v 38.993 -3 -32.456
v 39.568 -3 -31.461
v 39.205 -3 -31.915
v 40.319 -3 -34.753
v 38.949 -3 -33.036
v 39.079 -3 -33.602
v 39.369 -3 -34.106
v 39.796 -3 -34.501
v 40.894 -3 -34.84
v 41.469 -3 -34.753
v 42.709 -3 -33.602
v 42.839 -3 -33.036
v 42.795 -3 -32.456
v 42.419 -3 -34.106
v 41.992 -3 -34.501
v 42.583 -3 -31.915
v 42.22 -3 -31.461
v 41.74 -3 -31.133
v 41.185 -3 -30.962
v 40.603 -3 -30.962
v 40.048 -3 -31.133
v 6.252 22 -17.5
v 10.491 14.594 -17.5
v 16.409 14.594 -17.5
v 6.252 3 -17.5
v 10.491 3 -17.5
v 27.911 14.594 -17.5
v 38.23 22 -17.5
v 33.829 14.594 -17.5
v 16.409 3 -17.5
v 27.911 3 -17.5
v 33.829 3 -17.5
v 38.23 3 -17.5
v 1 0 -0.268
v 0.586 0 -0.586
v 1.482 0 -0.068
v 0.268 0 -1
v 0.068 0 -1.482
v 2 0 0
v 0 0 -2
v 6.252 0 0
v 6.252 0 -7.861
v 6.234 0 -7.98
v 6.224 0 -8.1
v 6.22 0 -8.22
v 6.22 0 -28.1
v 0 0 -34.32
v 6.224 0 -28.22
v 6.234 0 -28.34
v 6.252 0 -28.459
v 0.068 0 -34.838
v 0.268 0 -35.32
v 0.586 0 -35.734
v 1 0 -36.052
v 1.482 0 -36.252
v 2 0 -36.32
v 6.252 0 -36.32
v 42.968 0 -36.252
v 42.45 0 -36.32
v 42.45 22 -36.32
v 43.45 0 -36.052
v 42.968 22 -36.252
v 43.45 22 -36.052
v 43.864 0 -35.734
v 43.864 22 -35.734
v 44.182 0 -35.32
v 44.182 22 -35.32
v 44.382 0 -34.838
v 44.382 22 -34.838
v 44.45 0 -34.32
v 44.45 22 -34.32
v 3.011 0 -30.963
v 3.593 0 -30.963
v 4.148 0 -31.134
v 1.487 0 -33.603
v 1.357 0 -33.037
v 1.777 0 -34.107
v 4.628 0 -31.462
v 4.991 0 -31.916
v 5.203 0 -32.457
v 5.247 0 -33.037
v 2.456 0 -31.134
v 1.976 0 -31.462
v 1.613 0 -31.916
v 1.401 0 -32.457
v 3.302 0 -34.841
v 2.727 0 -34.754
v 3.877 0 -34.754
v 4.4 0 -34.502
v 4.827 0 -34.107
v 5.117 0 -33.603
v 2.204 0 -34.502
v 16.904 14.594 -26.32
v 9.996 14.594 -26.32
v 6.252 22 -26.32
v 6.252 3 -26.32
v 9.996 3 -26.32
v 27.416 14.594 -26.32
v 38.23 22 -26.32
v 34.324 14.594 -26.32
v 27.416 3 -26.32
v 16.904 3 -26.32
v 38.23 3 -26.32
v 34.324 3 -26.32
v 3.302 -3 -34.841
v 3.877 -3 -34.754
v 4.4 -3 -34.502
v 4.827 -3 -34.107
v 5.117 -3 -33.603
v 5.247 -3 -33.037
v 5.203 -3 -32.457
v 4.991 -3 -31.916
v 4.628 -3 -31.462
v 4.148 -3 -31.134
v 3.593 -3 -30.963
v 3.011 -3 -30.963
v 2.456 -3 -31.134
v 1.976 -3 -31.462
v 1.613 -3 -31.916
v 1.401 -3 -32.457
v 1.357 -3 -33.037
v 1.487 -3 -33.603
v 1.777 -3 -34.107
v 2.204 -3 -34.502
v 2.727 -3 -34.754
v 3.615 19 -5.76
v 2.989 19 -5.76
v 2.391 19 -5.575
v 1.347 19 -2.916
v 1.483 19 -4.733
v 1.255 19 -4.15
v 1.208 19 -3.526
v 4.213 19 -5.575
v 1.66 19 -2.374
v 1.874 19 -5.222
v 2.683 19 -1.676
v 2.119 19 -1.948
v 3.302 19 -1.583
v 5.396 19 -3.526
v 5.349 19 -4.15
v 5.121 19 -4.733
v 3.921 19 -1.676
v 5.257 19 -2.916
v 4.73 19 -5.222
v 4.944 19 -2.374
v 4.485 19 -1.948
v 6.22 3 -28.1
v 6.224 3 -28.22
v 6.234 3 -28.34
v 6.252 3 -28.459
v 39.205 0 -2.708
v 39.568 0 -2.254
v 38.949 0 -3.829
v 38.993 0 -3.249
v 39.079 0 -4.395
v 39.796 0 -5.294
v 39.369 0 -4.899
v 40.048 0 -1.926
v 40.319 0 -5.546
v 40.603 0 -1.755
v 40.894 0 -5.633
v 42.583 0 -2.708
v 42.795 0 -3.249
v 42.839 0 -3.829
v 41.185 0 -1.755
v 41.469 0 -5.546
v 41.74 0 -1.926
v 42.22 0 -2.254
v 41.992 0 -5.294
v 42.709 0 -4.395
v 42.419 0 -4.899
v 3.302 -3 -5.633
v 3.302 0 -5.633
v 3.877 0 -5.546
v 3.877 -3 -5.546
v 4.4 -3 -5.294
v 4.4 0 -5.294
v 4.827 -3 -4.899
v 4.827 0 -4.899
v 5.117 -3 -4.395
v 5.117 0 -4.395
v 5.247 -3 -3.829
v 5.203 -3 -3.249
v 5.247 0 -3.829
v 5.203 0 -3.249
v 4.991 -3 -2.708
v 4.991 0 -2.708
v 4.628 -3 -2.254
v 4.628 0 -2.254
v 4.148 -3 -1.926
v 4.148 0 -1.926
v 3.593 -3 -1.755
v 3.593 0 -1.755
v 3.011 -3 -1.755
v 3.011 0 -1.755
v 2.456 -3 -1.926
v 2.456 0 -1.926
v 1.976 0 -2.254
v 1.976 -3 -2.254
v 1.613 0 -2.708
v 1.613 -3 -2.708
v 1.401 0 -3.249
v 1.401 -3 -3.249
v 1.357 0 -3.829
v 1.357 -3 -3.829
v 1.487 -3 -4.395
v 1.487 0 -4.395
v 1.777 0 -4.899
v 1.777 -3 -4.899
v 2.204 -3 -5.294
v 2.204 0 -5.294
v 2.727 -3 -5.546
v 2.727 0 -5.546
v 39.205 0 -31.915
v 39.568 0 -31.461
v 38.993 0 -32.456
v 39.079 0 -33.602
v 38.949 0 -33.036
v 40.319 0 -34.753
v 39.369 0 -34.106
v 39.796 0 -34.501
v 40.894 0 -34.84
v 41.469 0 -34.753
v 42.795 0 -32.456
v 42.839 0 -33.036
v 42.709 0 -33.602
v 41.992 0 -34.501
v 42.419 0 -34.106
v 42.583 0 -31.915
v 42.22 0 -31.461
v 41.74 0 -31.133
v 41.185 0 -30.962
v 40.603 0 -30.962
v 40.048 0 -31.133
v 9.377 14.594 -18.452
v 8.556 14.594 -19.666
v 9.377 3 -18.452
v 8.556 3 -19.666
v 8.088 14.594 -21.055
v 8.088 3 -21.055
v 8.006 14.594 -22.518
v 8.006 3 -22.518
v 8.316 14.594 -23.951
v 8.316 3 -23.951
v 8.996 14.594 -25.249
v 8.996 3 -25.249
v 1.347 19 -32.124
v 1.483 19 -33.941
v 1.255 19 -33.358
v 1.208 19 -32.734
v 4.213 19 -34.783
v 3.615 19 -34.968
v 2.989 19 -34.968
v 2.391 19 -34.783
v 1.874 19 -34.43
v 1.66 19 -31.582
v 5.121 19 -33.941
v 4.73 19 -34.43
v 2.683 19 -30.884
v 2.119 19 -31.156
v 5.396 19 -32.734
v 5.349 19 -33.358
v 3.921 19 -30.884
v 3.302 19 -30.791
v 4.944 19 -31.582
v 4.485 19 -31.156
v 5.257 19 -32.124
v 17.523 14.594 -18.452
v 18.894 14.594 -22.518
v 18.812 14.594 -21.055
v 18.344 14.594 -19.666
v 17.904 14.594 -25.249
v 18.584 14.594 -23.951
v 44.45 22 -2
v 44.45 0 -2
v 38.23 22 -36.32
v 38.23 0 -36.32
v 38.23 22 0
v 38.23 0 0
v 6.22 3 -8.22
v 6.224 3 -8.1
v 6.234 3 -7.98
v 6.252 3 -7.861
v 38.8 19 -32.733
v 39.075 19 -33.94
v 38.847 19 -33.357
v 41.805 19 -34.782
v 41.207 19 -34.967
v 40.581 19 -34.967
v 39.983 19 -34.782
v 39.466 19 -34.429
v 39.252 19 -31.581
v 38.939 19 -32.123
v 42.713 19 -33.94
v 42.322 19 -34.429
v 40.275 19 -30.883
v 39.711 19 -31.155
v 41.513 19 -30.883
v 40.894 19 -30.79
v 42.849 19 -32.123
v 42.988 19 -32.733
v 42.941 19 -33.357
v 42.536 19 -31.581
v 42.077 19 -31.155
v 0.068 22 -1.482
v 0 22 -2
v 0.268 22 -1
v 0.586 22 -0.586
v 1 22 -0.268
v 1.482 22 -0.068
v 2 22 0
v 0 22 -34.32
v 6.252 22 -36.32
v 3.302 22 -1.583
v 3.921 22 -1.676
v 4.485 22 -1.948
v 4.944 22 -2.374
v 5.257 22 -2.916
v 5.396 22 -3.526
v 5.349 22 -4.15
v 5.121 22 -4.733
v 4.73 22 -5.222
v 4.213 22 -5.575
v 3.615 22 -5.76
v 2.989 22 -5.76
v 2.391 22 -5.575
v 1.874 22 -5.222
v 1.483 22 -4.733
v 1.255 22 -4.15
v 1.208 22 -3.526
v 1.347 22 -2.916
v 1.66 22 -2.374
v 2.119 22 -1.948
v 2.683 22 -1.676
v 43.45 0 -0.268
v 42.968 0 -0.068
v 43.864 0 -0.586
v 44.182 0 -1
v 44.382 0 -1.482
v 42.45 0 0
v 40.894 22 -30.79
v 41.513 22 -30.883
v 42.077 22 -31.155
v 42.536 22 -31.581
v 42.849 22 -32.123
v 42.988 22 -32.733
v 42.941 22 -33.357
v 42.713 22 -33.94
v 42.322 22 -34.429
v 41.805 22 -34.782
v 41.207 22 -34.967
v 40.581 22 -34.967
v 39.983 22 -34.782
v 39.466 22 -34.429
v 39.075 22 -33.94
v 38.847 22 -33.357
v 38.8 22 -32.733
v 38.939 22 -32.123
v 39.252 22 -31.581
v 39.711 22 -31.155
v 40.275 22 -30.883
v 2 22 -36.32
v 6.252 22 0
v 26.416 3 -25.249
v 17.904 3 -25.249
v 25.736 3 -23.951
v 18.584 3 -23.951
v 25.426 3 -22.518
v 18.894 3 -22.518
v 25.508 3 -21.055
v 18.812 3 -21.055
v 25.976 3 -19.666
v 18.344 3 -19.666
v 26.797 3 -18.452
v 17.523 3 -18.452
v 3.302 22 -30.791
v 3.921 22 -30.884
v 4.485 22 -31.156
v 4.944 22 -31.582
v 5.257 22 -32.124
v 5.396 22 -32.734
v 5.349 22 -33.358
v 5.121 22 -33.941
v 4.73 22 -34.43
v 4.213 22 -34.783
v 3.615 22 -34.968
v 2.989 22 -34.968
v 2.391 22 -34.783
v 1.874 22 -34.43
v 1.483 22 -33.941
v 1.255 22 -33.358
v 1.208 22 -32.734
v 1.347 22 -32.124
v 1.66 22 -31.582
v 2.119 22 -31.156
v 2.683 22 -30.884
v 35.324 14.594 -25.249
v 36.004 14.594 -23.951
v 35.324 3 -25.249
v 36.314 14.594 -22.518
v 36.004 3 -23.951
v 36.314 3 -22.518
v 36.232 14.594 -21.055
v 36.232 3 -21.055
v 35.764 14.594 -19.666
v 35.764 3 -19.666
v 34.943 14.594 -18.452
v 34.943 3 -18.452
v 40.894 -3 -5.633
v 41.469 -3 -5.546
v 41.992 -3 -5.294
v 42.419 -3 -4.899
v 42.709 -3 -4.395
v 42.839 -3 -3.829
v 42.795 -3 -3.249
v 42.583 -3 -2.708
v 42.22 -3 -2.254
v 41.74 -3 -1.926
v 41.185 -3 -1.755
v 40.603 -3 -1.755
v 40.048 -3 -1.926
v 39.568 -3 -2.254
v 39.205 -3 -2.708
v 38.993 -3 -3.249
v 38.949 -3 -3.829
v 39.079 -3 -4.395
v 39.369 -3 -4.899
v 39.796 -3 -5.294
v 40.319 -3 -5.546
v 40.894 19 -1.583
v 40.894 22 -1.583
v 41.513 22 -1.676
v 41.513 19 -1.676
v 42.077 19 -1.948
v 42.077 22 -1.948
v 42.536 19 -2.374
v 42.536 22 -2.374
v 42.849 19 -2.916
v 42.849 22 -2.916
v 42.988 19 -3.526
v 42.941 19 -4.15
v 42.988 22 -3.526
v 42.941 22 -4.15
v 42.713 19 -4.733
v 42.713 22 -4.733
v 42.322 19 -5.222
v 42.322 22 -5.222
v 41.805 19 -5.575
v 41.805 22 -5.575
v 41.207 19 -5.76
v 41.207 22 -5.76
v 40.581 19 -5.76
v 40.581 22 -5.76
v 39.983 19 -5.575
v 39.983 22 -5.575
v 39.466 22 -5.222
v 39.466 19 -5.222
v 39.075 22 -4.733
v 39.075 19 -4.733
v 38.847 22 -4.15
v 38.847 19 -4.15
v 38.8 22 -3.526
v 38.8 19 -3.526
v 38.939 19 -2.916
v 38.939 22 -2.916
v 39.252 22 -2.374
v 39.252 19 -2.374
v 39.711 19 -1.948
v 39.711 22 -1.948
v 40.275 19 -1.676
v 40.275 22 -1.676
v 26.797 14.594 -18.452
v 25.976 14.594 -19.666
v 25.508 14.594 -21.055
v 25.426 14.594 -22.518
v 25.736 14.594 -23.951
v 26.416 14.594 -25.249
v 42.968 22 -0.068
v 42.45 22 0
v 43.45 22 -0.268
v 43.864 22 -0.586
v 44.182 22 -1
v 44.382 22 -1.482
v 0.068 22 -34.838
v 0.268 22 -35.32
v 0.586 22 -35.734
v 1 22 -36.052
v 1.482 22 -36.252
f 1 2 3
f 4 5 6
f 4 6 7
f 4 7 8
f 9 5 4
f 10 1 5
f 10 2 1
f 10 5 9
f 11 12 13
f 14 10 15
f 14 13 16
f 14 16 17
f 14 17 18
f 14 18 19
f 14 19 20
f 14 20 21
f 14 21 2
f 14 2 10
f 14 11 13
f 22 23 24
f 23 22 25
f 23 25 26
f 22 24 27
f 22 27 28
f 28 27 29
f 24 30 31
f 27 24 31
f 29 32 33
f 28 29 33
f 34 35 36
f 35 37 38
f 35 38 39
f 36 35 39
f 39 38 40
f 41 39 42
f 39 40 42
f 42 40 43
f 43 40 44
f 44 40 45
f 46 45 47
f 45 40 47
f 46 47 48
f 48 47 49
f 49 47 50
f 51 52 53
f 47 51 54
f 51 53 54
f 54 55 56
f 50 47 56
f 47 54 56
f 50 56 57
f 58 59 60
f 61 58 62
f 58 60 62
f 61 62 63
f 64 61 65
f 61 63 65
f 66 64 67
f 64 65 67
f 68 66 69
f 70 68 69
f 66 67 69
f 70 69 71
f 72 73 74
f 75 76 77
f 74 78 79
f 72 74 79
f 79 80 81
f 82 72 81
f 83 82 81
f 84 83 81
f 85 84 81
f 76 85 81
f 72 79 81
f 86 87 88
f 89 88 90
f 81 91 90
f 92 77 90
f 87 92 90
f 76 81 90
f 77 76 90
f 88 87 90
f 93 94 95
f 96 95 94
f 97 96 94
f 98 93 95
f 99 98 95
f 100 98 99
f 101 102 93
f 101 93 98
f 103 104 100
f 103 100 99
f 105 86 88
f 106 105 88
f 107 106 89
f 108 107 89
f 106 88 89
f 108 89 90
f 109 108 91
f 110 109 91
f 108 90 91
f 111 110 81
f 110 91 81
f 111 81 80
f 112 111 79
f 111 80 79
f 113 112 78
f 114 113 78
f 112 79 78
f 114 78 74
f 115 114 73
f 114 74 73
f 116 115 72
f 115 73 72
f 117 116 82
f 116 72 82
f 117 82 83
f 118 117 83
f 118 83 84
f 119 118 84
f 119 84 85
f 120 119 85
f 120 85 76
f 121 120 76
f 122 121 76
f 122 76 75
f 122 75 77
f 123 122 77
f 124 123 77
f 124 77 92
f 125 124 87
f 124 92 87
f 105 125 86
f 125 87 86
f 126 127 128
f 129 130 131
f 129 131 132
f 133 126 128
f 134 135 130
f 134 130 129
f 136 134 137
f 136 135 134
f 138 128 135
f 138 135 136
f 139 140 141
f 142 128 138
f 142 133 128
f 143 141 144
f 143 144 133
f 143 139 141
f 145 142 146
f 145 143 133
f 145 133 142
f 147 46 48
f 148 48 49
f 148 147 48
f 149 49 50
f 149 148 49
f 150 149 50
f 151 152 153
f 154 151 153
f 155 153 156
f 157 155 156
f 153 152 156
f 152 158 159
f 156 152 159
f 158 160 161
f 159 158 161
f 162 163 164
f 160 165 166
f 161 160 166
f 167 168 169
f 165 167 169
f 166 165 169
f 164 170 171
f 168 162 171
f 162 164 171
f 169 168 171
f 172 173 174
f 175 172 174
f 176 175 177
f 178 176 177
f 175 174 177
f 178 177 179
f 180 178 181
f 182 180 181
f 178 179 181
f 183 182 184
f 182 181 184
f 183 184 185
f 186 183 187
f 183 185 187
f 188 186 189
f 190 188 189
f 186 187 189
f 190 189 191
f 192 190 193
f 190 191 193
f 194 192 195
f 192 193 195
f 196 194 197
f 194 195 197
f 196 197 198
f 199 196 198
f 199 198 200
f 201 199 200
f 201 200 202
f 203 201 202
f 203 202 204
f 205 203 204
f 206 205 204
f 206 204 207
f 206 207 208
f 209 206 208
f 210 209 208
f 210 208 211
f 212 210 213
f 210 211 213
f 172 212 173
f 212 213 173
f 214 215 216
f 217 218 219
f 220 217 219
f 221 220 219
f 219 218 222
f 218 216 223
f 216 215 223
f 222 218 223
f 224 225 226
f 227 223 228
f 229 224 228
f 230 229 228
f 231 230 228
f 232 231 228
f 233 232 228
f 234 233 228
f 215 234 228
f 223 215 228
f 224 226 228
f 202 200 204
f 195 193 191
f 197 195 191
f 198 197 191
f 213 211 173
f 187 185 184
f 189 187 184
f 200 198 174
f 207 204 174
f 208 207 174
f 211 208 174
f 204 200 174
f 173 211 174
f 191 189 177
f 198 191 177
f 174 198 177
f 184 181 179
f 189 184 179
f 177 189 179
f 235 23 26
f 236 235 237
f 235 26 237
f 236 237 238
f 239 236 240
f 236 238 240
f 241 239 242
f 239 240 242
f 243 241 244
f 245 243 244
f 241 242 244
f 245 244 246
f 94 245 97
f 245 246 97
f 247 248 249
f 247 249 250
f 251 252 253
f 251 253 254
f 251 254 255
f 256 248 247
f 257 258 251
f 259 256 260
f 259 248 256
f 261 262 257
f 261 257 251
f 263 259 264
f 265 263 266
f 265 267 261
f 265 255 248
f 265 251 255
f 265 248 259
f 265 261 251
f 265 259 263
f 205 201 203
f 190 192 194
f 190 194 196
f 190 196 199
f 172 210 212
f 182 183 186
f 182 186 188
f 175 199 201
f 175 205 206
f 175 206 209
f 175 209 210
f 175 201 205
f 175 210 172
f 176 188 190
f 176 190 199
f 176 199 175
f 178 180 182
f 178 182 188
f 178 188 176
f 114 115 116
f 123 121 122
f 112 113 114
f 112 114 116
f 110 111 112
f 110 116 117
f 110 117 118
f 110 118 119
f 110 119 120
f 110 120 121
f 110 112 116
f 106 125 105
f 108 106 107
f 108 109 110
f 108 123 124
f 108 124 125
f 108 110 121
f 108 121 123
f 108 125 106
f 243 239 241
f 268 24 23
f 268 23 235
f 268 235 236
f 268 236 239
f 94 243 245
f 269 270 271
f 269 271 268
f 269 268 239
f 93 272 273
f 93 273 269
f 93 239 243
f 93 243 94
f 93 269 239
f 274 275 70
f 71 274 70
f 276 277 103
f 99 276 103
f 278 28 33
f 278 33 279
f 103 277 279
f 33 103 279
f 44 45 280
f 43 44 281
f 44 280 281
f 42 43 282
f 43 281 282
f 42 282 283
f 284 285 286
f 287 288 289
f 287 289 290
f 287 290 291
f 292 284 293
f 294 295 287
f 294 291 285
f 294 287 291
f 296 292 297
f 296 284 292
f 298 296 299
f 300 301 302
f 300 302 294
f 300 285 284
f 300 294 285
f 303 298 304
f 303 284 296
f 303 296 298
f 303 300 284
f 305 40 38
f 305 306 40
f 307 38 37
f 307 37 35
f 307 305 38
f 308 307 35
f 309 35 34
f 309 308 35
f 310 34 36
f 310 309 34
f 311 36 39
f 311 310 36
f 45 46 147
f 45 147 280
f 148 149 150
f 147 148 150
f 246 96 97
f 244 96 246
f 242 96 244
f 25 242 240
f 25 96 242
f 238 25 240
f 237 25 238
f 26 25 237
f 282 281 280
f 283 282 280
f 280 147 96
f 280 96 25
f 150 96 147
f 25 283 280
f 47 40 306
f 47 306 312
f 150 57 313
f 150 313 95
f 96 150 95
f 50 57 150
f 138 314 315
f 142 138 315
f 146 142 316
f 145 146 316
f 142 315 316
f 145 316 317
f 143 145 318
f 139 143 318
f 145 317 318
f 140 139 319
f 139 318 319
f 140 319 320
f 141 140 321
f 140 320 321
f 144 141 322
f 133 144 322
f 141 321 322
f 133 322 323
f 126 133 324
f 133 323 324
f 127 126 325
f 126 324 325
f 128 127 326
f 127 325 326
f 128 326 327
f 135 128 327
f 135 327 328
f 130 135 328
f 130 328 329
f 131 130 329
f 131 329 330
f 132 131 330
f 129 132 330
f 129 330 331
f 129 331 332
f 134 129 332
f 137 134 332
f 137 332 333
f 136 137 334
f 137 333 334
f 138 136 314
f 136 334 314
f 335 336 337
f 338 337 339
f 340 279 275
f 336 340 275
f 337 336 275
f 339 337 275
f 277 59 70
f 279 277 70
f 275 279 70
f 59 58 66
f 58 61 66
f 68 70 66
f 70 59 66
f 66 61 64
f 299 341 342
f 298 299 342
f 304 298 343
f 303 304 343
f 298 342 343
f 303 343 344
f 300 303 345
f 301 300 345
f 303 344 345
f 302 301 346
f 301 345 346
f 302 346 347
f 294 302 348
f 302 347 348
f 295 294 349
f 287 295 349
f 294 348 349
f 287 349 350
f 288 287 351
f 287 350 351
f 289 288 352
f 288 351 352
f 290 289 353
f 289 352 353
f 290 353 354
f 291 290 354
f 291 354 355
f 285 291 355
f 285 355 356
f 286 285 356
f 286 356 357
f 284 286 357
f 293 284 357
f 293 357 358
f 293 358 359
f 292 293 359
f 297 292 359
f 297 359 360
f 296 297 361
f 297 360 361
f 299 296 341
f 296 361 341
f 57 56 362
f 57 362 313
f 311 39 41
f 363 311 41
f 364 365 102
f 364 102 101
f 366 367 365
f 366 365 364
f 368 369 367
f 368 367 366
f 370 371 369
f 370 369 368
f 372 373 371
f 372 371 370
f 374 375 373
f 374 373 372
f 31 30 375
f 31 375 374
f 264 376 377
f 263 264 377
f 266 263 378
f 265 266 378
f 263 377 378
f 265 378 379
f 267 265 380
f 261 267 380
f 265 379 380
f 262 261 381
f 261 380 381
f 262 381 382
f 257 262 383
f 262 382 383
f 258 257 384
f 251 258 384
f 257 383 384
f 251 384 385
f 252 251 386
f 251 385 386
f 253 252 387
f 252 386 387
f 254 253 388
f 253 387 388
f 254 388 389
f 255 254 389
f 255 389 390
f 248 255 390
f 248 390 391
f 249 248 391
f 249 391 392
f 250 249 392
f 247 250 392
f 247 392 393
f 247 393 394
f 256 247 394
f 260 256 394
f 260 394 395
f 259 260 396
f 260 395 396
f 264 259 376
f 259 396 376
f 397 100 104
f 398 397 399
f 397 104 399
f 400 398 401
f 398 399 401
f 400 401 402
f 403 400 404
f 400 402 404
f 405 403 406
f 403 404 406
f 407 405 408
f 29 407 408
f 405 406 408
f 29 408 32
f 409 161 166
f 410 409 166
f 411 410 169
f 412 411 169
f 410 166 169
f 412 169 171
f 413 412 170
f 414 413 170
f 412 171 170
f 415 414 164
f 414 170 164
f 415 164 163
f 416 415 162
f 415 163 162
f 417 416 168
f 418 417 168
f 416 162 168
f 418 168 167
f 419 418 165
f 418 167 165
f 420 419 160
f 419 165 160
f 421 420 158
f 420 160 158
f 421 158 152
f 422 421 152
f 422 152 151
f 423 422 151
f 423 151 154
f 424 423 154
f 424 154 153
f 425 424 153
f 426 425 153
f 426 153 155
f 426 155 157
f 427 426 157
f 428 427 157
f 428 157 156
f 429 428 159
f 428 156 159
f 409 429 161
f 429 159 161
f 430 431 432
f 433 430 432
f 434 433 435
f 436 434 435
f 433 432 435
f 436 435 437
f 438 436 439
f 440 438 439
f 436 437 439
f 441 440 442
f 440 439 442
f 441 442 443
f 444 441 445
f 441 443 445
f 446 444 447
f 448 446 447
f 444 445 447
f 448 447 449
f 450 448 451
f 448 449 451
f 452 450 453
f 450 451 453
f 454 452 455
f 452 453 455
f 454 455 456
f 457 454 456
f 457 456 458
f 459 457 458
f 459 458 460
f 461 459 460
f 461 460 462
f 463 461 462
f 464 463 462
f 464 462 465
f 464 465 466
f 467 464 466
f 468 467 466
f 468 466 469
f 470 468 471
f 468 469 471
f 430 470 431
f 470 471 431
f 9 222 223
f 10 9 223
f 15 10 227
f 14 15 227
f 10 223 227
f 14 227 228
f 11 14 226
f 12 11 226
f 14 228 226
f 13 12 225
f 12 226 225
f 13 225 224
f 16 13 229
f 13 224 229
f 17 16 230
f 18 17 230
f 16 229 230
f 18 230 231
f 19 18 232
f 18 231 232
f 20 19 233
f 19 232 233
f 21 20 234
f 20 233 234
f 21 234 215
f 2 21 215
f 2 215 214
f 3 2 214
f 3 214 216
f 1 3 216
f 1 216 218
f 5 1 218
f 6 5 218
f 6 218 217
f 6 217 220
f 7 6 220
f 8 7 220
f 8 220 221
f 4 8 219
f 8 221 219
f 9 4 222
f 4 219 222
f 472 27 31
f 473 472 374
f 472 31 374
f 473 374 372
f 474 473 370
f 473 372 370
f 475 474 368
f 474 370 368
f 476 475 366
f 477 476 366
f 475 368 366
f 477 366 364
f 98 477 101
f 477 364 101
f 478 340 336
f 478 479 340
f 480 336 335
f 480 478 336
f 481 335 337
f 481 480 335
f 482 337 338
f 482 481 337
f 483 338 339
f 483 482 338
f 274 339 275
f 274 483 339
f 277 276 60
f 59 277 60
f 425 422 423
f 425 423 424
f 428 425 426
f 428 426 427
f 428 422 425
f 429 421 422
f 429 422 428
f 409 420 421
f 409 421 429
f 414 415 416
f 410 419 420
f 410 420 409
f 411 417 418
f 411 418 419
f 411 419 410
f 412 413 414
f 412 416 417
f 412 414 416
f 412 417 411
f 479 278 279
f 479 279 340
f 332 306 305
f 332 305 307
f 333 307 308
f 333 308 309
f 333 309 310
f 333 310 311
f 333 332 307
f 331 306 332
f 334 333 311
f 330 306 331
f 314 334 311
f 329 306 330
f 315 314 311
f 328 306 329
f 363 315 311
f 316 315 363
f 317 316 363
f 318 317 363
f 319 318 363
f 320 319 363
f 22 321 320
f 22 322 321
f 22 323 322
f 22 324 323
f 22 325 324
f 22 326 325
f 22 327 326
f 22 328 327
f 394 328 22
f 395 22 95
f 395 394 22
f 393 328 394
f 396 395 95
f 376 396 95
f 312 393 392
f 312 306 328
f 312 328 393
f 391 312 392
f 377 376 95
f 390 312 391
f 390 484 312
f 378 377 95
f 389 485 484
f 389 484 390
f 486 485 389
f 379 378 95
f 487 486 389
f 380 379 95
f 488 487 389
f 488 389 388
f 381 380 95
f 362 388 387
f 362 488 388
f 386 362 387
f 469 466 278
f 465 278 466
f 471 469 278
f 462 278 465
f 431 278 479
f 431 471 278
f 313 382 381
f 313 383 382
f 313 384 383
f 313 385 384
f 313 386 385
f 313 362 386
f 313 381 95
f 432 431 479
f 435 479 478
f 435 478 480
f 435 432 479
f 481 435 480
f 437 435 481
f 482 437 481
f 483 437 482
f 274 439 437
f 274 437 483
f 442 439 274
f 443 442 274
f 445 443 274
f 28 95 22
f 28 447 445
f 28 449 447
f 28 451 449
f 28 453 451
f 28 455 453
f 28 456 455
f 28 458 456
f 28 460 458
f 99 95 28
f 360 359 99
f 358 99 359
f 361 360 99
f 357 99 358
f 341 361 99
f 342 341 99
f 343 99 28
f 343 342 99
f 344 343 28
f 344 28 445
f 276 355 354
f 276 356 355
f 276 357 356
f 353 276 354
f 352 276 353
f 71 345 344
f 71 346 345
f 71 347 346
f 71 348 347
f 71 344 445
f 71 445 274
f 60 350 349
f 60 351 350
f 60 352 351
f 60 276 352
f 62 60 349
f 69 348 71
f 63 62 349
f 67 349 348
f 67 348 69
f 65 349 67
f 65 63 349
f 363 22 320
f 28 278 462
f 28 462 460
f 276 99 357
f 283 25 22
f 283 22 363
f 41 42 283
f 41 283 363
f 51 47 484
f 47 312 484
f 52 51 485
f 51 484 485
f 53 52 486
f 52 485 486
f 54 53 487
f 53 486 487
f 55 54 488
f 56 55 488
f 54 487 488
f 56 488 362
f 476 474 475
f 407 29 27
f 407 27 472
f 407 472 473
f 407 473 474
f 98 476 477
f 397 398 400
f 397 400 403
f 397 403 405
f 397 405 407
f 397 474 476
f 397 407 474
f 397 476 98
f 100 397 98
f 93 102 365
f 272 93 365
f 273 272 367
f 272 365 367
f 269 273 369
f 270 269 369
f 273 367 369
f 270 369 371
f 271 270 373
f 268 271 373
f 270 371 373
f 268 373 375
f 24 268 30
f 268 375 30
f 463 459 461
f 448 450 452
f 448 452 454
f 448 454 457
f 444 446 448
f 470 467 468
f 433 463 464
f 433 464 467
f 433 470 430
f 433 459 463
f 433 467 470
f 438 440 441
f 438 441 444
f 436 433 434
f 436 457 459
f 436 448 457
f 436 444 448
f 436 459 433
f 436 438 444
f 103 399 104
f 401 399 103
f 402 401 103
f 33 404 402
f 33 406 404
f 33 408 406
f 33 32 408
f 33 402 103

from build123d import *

# Parameters (mm, degrees)
SKETCH_1_W          = 44.45
SKETCH_1_H          = 36.32
EXTRUDE_1_DEPTH     = 22
SKETCH_2_R          = 2.1
SKETCH_2_R_2        = 1
CUT_EXTRUDE_1_DEPTH = 3
FILLET_2_R          = 2
SKETCH_5_W          = 32.01
SKETCH_5_H          = 23.88
CUT_EXTRUDE_2_DEPTH = 3
FILLET_3_R          = 2
SKETCH_6_R          = 5.461
CUT_EXTRUDE_3_DEPTH = 11.5942
SKETCH_7_R          = 1.95
EXTRUDE_2_DEPTH     = 3
EXTRUDE_2_2_DEPTH   = 3
EXTRUDE_2_3_DEPTH   = 3
EXTRUDE_2_4_DEPTH   = 3
SKETCH_8_W          = 31.977593618
SKETCH_8_H          = 17.5
SKETCH_8_H_2        = 10
CUT_EXTRUDE_4_DEPTH = 62.473123396


with BuildPart() as part:
    # Эскиз1 → Бобышка-Вытянуть1 (new body)
    with BuildSketch(Plane(origin=(0, 0, 0), x_dir=(1, 0, 0), z_dir=(0, 1, 0))):
        with Locations((22.225, 18.16)):
            Rectangle(SKETCH_1_W, SKETCH_1_H)
    extrude(amount=EXTRUDE_1_DEPTH)

    # Эскиз2 → Вырез-Вытянуть1 (cut)
    with BuildSketch(Plane(origin=(0, 22, 0), x_dir=(1, 0, 0), z_dir=(0, 1, 0))):
        with Locations(Location((3.302, 32.891, 0), (0, 0, 270))):
            Circle(SKETCH_2_R)
        with Locations(Location((40.894, 32.89, 0), (0, 0, 270))):
            Circle(SKETCH_2_R)
        with Locations(Location((40.894, 3.683, 0), (0, 0, 270))):
            Circle(SKETCH_2_R)
        with Locations(Location((3.302, 3.683, 0), (0, 0, 270))):
            Circle(SKETCH_2_R)
        with Locations((22.225, 36.32)):
            Circle(SKETCH_2_R_2)
    extrude(amount=-CUT_EXTRUDE_1_DEPTH, mode=Mode.SUBTRACT)

    # Скругление2
    fillet_2_edges = [part.edges().sort_by_distance(p)[0] for p in [
        (0, 11, -36.32),
        (44.45, 11, -36.32),
        (44.45, 11, 0),
        (0, 11, 0),
    ]]
    fillet(fillet_2_edges, radius=FILLET_2_R)

    # Эскиз5 → Вырез-Вытянуть2 (cut)
    with BuildSketch(Plane.XZ):
        with Locations((22.225, -18.16)):
            Rectangle(SKETCH_5_W, SKETCH_5_H)
    extrude(amount=-CUT_EXTRUDE_2_DEPTH, mode=Mode.SUBTRACT)

    # Скругление3
    fillet_3_edges = [part.edges().sort_by_distance(p)[0] for p in [
        (6.22, 1.5, -30.1),
        (6.22, 1.5, -6.22),
        (38.23, 1.5, -6.22),
        (38.23, 1.5, -30.1),
    ]]
    fillet(fillet_3_edges, radius=FILLET_3_R)

    # Эскиз6 → Вырез-Вытянуть3 (cut)
    with BuildSketch(Plane.XZ.offset(-3)):
        with Locations(Location((30.87, -22.09, 0), (0, 0, 270))):
            Circle(SKETCH_6_R)
        with Locations(Location((13.45, -22.09, 0), (0, 0, 270))):
            Circle(SKETCH_6_R)
    extrude(amount=-CUT_EXTRUDE_3_DEPTH, mode=Mode.SUBTRACT)

    # Эскиз8 → Вырез-Вытянуть4 (cut, through all)
    with BuildSketch(Plane.XZ):
        with Locations((22.241203191, -8.75)):
            Rectangle(SKETCH_8_W, SKETCH_8_H)
        with Locations((22.241203191, -31.32)):
            Rectangle(SKETCH_8_W, SKETCH_8_H_2)
    extrude(amount=-CUT_EXTRUDE_4_DEPTH, mode=Mode.SUBTRACT)


with BuildPart() as body_2:
    # Эскиз7 → Бобышка-Вытянуть2 (new body)
    with BuildSketch(Plane.XZ):
        with Locations(Location((3.302, -3.683, 0), (0, 0, 270))):
            Circle(SKETCH_7_R)
    extrude(amount=EXTRUDE_2_DEPTH)


with BuildPart() as body_3:
    # Эскиз7 → Extrude 2 2 (new body)
    with BuildSketch(Plane.XZ):
        with Locations(Location((3.302, -32.891, 0), (0, 0, 270))):
            Circle(SKETCH_7_R)
    extrude(amount=EXTRUDE_2_2_DEPTH)


with BuildPart() as body_4:
    # Эскиз7 → Extrude 2 3 (new body)
    with BuildSketch(Plane.XZ):
        with Locations(Location((40.894, -32.89, 0), (0, 0, 270))):
            Circle(SKETCH_7_R)
    extrude(amount=EXTRUDE_2_3_DEPTH)


with BuildPart() as body_5:
    # Эскиз7 → Extrude 2 4 (new body)
    with BuildSketch(Plane.XZ):
        with Locations(Location((40.894, -3.683, 0), (0, 0, 270))):
            Circle(SKETCH_7_R)
    extrude(amount=EXTRUDE_2_4_DEPTH)


solid = Compound([part.part, body_2.part, body_3.part, body_4.part, body_5.part])
